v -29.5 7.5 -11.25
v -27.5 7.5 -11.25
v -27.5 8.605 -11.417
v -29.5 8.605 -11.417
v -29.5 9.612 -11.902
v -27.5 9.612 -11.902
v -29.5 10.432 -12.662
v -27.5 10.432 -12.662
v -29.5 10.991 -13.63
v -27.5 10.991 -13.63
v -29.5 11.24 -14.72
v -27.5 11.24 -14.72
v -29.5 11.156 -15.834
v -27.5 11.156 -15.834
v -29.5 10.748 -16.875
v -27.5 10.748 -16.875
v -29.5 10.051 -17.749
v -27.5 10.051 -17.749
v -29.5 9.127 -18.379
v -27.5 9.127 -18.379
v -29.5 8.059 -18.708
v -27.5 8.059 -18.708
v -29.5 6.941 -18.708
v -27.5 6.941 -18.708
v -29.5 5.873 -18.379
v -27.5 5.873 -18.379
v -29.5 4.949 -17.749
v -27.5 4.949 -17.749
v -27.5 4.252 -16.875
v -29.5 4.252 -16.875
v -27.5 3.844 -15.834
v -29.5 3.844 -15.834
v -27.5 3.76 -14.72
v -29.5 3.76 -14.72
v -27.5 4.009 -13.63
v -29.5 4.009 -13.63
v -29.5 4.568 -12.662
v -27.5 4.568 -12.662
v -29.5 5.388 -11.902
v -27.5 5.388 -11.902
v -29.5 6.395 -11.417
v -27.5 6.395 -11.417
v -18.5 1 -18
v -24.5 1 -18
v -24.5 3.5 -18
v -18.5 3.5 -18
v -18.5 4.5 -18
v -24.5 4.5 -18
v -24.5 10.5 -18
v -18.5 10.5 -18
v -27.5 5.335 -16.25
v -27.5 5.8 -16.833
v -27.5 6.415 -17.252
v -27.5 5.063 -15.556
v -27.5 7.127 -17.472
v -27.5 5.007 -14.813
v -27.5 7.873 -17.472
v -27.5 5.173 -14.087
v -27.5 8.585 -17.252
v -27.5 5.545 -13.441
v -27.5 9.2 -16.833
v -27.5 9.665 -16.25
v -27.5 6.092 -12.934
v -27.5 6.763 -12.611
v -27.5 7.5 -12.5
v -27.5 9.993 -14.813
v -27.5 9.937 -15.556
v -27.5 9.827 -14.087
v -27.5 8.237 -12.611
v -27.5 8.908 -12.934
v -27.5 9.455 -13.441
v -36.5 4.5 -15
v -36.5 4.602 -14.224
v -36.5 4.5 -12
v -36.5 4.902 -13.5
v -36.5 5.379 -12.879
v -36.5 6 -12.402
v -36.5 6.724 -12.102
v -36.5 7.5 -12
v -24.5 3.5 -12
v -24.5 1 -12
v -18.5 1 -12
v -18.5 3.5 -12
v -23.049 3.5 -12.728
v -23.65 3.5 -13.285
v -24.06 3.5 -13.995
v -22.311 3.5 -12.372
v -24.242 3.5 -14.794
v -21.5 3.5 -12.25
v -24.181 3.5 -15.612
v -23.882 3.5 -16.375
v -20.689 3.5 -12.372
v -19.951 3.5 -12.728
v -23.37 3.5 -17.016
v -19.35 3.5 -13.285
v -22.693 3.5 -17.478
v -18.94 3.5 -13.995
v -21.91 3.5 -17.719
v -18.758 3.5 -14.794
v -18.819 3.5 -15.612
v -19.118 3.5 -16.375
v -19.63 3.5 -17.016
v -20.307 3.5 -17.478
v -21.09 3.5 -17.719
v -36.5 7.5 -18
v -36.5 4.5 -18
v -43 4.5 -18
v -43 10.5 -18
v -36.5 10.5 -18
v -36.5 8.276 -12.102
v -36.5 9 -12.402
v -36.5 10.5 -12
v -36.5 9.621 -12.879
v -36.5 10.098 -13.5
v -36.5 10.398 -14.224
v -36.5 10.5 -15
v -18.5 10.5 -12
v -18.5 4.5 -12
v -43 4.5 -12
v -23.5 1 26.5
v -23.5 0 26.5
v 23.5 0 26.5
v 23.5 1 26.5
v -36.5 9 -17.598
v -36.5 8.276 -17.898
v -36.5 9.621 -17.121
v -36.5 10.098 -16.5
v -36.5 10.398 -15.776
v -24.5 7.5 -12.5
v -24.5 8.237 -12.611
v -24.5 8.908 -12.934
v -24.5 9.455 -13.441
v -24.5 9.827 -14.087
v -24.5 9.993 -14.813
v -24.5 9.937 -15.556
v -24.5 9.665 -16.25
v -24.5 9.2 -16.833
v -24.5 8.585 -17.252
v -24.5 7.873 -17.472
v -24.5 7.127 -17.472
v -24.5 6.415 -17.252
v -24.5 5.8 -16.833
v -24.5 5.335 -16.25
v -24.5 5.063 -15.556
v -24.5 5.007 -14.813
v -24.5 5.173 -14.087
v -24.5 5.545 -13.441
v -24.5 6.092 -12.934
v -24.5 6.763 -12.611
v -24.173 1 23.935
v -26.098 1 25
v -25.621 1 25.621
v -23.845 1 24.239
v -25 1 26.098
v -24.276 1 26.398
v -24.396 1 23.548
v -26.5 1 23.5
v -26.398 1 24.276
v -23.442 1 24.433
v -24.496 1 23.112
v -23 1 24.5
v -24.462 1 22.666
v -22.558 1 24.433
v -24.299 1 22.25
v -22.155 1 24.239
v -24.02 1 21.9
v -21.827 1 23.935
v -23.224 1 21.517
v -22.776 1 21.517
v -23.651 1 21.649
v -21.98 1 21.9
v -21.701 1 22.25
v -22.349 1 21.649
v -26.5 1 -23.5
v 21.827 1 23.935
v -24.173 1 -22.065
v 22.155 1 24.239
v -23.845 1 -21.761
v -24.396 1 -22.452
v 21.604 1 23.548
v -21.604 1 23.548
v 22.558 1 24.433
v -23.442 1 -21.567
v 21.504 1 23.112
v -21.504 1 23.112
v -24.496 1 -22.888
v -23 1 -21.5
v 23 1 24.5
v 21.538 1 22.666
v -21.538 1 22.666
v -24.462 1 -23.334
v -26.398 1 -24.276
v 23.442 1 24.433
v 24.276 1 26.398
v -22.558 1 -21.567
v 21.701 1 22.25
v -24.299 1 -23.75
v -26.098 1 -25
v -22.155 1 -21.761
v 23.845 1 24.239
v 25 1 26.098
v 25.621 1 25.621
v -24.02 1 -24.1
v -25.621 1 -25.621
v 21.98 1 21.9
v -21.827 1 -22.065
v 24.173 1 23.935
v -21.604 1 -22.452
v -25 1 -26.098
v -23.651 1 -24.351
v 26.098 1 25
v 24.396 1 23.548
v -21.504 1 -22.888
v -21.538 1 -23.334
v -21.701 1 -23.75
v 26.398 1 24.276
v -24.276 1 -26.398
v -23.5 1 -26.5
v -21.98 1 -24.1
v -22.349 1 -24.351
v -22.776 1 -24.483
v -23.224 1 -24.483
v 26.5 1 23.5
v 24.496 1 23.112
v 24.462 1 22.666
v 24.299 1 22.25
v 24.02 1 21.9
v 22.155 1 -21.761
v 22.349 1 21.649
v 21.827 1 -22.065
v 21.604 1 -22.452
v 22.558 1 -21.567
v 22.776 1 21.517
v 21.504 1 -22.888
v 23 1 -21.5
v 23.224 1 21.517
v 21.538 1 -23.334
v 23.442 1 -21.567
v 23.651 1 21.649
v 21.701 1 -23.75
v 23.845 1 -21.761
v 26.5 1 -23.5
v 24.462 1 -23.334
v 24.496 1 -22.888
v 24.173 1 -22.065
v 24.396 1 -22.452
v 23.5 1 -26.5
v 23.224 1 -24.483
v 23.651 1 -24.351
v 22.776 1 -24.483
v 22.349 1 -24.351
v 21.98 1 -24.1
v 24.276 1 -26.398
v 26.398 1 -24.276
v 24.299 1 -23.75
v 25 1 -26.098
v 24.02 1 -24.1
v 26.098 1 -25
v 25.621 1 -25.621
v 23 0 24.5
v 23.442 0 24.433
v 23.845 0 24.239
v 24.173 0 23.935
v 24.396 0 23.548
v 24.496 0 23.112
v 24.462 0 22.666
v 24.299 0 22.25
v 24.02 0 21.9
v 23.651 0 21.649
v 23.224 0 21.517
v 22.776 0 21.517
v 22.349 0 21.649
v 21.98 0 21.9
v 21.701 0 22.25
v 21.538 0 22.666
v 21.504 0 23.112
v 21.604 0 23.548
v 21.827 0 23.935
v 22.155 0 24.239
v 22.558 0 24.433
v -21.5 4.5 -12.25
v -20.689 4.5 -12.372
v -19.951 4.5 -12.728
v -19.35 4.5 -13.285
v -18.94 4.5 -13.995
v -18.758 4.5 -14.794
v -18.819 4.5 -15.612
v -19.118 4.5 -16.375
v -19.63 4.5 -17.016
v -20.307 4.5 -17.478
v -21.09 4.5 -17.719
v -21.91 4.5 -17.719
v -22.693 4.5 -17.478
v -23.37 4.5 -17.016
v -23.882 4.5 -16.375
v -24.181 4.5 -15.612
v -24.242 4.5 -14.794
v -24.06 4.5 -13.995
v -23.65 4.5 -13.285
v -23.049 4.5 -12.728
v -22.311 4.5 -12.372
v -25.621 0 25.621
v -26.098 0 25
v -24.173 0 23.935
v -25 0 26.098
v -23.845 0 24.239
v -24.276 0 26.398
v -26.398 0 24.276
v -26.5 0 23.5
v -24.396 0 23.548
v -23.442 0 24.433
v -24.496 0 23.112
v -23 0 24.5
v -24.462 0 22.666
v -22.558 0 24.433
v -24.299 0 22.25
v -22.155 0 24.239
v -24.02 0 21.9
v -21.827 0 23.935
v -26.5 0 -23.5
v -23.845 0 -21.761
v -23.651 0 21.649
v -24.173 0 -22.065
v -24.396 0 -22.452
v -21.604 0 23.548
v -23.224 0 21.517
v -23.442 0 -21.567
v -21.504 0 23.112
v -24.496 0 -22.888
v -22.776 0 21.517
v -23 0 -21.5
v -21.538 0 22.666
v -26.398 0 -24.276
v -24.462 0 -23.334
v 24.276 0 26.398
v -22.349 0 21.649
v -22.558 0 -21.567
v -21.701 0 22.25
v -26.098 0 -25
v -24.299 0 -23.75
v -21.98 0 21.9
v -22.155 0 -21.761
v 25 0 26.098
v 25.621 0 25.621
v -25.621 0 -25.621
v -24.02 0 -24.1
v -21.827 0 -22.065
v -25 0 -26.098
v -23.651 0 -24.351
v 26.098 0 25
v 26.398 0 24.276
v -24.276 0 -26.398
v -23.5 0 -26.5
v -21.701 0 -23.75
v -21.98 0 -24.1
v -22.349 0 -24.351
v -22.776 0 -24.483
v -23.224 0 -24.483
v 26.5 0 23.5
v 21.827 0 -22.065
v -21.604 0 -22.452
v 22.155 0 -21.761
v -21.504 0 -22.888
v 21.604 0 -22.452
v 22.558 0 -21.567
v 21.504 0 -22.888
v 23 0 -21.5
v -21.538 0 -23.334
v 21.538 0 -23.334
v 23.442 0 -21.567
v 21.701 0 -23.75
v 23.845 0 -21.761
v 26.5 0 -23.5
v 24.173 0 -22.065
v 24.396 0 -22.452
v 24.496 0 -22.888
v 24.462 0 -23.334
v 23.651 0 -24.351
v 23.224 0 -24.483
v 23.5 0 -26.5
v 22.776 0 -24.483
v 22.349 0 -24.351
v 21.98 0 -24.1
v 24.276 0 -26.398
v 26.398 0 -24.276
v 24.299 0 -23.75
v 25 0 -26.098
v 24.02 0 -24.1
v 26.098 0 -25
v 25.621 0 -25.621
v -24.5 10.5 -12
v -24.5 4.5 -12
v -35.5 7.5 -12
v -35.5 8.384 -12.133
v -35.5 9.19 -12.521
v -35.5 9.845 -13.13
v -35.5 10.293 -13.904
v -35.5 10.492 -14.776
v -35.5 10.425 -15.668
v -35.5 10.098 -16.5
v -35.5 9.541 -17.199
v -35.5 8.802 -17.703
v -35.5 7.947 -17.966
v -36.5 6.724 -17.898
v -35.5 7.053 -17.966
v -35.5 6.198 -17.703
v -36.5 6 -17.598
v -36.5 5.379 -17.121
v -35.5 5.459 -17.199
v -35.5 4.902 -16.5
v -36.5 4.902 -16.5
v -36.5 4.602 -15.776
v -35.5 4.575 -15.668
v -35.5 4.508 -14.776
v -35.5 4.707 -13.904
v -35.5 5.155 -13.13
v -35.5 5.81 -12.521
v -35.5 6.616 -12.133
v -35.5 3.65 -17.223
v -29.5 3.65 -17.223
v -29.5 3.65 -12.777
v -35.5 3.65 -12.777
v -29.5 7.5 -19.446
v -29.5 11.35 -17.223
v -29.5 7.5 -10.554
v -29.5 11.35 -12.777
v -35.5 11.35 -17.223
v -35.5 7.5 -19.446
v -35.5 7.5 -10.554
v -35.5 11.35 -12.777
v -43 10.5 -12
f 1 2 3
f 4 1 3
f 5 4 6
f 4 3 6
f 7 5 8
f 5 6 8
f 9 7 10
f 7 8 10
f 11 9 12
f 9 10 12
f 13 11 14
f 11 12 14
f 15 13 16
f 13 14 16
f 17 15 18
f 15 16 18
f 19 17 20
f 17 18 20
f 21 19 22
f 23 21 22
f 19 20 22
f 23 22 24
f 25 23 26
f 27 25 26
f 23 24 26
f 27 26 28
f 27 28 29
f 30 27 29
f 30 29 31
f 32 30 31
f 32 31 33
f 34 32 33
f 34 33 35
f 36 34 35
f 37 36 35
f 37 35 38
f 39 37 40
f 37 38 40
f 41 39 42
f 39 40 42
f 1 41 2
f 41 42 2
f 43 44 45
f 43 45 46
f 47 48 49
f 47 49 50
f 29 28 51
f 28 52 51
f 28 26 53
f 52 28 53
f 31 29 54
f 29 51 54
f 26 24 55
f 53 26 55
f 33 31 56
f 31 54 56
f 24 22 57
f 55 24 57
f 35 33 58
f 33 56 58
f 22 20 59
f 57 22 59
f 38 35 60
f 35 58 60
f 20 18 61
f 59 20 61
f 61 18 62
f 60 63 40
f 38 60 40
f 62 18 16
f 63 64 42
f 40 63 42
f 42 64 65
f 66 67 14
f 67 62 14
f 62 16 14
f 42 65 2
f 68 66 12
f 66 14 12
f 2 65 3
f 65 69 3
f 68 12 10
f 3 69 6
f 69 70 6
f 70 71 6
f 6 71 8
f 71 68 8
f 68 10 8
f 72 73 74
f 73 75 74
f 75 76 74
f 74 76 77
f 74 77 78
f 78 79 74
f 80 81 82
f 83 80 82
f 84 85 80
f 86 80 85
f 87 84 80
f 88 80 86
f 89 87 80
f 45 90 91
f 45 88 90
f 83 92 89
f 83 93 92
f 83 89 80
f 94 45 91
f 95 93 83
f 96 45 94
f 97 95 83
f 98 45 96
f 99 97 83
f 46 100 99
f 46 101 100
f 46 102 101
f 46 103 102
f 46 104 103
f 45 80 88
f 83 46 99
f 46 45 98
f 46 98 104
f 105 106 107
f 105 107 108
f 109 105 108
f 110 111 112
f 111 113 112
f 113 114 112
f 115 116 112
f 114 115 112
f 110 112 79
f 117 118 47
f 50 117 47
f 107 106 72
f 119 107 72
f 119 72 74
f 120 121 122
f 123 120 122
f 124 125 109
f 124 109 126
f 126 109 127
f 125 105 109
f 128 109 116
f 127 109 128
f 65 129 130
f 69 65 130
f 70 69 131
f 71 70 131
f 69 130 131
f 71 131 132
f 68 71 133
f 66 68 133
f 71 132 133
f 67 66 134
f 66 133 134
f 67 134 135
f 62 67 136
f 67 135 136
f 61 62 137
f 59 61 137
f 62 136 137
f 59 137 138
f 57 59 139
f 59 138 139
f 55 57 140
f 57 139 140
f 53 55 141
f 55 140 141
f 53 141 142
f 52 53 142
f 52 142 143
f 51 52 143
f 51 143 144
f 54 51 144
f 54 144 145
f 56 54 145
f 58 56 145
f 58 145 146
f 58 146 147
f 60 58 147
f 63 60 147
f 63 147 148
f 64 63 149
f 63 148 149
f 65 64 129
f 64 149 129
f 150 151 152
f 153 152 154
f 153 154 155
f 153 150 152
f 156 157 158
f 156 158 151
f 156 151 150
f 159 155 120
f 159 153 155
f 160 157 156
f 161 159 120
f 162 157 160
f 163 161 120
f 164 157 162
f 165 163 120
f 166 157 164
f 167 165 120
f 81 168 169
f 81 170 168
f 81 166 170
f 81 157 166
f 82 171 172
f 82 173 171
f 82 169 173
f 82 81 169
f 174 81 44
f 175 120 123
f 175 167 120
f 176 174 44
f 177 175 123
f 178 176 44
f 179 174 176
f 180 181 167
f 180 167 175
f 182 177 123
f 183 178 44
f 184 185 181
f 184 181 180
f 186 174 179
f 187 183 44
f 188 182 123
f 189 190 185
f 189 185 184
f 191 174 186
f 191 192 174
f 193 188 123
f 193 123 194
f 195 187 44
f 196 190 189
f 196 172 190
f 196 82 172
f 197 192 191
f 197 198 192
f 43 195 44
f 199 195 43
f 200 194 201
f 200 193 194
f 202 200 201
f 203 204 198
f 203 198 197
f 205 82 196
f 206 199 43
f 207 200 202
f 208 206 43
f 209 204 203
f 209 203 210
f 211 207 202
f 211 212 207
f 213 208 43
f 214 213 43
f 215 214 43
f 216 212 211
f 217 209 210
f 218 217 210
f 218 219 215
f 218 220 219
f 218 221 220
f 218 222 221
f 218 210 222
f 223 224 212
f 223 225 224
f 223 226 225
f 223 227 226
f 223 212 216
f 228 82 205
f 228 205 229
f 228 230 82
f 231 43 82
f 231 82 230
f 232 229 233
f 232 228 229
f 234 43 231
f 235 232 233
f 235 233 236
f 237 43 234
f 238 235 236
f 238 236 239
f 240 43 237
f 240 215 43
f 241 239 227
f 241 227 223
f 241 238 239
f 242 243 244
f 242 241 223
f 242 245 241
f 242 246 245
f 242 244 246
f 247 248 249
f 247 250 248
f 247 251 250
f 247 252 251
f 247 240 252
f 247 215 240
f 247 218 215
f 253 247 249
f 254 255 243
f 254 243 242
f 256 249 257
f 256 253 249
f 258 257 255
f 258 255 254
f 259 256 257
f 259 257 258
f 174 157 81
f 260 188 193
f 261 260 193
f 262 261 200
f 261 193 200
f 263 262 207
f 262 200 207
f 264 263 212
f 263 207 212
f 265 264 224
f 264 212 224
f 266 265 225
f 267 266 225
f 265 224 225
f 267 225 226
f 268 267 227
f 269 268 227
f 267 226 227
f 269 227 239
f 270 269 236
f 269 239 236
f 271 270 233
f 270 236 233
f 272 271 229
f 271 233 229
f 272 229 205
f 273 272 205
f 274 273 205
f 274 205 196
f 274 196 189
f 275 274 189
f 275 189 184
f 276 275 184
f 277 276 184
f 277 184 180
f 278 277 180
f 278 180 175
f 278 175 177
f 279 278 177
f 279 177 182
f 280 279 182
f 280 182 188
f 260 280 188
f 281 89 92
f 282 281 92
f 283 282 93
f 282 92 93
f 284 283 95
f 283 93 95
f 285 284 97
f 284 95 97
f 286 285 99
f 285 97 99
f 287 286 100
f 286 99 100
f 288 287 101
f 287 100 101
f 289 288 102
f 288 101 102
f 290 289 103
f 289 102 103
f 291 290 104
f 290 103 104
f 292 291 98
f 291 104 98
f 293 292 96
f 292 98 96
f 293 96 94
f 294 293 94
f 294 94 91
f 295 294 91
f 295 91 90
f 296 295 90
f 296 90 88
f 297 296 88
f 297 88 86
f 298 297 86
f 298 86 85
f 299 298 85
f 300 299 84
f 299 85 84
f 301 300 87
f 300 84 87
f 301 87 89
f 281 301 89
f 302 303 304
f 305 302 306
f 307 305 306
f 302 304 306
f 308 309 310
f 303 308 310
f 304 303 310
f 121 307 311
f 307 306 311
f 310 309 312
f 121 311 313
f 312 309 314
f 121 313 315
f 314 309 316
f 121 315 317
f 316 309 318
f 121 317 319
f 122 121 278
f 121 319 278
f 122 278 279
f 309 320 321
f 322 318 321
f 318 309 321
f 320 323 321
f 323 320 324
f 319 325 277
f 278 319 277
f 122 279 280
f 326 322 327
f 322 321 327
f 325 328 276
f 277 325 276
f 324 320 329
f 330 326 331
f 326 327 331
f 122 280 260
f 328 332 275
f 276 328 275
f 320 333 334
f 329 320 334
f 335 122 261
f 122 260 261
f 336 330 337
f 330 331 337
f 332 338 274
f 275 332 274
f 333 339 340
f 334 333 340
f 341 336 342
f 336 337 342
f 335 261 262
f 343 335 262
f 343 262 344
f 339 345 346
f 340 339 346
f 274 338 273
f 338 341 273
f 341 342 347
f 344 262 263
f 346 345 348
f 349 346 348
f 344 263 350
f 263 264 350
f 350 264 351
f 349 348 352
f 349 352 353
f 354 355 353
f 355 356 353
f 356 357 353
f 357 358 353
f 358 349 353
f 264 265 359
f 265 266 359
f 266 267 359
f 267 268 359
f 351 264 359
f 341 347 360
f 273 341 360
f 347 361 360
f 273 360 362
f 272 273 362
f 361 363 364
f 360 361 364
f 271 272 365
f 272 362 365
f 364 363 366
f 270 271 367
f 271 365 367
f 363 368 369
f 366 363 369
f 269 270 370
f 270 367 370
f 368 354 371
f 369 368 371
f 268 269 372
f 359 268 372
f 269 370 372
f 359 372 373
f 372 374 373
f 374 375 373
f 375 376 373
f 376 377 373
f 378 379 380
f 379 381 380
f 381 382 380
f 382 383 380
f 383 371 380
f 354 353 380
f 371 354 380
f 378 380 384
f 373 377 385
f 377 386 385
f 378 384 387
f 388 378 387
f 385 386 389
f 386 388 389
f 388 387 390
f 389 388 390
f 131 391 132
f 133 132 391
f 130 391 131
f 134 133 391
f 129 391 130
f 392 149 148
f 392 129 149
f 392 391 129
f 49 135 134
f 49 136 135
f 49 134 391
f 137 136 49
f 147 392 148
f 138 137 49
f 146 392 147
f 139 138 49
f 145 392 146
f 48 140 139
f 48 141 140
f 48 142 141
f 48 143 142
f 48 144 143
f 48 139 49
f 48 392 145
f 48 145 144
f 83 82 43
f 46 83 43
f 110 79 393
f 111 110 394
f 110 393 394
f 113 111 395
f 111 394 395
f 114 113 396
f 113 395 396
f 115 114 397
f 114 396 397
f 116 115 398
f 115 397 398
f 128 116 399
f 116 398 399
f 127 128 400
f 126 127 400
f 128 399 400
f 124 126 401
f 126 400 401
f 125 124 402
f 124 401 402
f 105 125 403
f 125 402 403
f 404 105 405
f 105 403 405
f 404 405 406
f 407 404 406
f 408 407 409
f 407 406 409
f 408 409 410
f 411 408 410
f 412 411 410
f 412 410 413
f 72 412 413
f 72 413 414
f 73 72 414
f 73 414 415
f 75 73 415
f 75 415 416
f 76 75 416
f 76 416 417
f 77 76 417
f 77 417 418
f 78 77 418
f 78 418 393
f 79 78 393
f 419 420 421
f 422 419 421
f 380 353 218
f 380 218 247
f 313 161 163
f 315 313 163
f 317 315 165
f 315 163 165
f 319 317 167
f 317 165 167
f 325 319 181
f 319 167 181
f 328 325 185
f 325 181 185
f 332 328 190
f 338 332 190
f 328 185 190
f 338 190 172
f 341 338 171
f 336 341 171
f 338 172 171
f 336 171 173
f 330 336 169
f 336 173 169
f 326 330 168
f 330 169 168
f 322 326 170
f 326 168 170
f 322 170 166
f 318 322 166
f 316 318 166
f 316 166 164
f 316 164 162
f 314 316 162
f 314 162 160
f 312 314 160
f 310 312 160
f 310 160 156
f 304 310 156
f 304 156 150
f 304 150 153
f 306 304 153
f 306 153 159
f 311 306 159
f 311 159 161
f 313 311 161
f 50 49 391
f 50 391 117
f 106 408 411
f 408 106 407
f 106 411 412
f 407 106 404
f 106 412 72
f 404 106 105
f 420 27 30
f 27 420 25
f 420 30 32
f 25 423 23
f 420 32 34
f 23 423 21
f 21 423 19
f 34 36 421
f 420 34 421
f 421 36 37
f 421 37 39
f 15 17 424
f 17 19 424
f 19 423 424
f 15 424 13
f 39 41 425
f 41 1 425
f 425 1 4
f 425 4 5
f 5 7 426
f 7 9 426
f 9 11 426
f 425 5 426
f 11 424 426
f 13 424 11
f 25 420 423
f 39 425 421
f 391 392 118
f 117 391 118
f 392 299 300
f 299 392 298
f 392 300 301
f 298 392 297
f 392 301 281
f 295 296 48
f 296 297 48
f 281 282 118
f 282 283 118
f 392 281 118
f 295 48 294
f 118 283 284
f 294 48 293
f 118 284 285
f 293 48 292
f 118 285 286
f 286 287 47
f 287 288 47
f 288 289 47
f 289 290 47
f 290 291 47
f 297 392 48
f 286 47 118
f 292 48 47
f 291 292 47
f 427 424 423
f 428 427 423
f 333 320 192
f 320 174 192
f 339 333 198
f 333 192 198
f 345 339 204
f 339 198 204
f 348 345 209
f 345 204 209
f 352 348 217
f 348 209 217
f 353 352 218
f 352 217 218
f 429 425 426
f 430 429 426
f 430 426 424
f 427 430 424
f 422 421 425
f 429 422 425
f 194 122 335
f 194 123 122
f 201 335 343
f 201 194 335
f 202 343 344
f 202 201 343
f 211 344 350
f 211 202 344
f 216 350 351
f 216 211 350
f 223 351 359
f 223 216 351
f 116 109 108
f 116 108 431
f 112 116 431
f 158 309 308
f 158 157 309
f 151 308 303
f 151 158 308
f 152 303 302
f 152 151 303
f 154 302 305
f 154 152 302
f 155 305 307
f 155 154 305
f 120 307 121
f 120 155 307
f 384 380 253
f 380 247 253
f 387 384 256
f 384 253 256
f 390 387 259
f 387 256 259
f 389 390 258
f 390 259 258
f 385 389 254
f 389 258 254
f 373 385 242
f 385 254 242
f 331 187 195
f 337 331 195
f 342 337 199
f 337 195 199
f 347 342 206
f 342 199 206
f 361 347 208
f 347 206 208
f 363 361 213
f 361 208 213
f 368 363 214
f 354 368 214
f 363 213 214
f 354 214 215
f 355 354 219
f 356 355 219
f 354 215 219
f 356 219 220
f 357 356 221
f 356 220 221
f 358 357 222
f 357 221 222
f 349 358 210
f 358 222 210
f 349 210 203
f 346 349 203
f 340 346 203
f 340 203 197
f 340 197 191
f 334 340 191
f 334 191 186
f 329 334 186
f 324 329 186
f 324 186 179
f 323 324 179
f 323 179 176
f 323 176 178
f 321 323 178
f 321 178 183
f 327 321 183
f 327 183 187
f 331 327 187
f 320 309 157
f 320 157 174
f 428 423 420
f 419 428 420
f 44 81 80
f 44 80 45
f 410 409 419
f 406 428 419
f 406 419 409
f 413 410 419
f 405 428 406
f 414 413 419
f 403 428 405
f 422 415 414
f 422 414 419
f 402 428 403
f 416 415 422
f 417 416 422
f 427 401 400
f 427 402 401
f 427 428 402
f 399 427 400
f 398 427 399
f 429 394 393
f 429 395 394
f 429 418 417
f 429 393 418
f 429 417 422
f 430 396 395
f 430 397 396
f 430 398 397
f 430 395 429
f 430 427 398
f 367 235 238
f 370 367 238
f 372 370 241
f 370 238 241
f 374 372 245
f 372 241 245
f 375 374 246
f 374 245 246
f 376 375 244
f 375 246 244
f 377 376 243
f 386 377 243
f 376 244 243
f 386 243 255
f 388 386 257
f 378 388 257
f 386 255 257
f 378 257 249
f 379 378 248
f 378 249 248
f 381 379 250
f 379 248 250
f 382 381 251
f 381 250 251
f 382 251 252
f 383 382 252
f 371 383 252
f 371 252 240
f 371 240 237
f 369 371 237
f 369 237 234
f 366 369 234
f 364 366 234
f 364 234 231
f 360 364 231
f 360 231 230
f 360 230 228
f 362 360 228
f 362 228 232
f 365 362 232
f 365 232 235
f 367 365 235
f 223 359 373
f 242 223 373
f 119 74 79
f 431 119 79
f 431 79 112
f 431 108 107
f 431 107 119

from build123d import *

# Parameters (mm, degrees)
SKETCH_1_W          = 53
SKETCH_1_H          = 53
EXTRUDE_1_DEPTH     = 1
SKETCH_2_W          = 6
SKETCH_2_H          = 6
EXTRUDE_2_DEPTH     = 2.5
SKETCH_3_R          = 2.75
EXTRUDE_3_DEPTH     = 1
SKETCH_4_W          = 6
SKETCH_4_H          = 6
EXTRUDE_4_DEPTH     = 6
SKETCH_5_R          = 2.5
EXTRUDE_5_DEPTH     = 3
SKETCH_6_R          = 3.75
EXTRUDE_6_DEPTH     = 2
EXTRUDE_7_DEPTH     = 6
SKETCH_8_R          = 3
EXTRUDE_8_DEPTH     = 1
SKETCH_9_W          = 6
SKETCH_9_H          = 6
EXTRUDE_9_DEPTH     = 6.5
SKETCH_11_R         = 1.5
CUT_EXTRUDE_1_DEPTH = 52.559407483
FILLET_1_R          = 3


with BuildPart() as part:
    # 草图1 → 凸台-拉伸1 (new body)
    with BuildSketch(Plane(origin=(0, 0, 0), x_dir=(1, 0, 0), z_dir=(0, 1, 0))):
        Rectangle(SKETCH_1_W, SKETCH_1_H)
    extrude(amount=EXTRUDE_1_DEPTH)

    # 草图2 → 凸台-拉伸2 (add)
    with BuildSketch(Plane(origin=(0, 1, 0), x_dir=(1, 0, 0), z_dir=(0, 1, 0))):
        with Locations((-21.5, 15)):
            Rectangle(SKETCH_2_W, SKETCH_2_H)
    extrude(amount=EXTRUDE_2_DEPTH)

    # 草图3 → 凸台-拉伸3 (add)
    with BuildSketch(Plane(origin=(0, 3.5, 0), x_dir=(1, 0, 0), z_dir=(0, 1, 0))):
        with Locations(Location((-21.5, 15, 0), (0, 0, 270))):
            Circle(SKETCH_3_R)
    extrude(amount=EXTRUDE_3_DEPTH)

    # 草图4 → 凸台-拉伸4 (add)
    with BuildSketch(Plane(origin=(0, 4.5, 0), x_dir=(1, 0, 0), z_dir=(0, 1, 0))):
        with Locations((-21.5, 15)):
            Rectangle(SKETCH_4_W, SKETCH_4_H)
    extrude(amount=EXTRUDE_4_DEPTH)

    # 草图5 → 凸台-拉伸5 (add)
    with BuildSketch(Plane.ZY.offset(24.5)):
        with Locations((-15, 7.5)):
            Circle(SKETCH_5_R)
    extrude(amount=EXTRUDE_5_DEPTH)

    # 草图6 → 凸台-拉伸6 (add)
    with BuildSketch(Plane.ZY.offset(27.5)):
        with Locations((-15, 7.5)):
            Circle(SKETCH_6_R)
    extrude(amount=EXTRUDE_6_DEPTH)

    # 草图7 → 凸台-拉伸7 (add)
    with BuildSketch(Plane.ZY.offset(29.5)):
        Polygon((-10.554402927, 7.5), (-12.777201464, 11.35), (-17.222798536, 11.35), (-19.445597073, 7.5), (-17.222798536, 3.65), (-12.777201464, 3.65), align=None)
    extrude(amount=EXTRUDE_7_DEPTH)

    # 草图8 → 凸台-拉伸8 (add)
    with BuildSketch(Plane.ZY.offset(35.5)):
        with Locations((-15, 7.5)):
            Circle(SKETCH_8_R)
    extrude(amount=EXTRUDE_8_DEPTH)

    # 草图9 → 凸台-拉伸9 (add)
    with BuildSketch(Plane.ZY.offset(36.5)):
        with Locations((-15, 7.5)):
            Rectangle(SKETCH_9_W, SKETCH_9_H)
    extrude(amount=EXTRUDE_9_DEPTH)

    # 草图11 → 切除-拉伸1 (cut, through all)
    with BuildSketch(Plane(origin=(0, 1, 0), x_dir=(1, 0, 0), z_dir=(0, 1, 0))):
        with Locations(Location((-23, -23, 0), (0, 0, 270))):
            Circle(SKETCH_11_R)
        with Locations(Location((-23, 23, 0), (0, 0, 270))):
            Circle(SKETCH_11_R)
        with Locations(Location((23, 23, 0), (0, 0, 270))):
            Circle(SKETCH_11_R)
        with Locations(Location((23, -23, 0), (0, 0, 270))):
            Circle(SKETCH_11_R)
    extrude(amount=-CUT_EXTRUDE_1_DEPTH, mode=Mode.SUBTRACT)

    # 圆角1
    fillet_1_edges = [part.edges().sort_by_distance(p)[0] for p in [
        (26.5, 0.5, 26.5),
        (-26.5, 0.5, 26.5),
        (-26.5, 0.5, -26.5),
        (26.5, 0.5, -26.5),
    ]]
    fillet(fillet_1_edges, radius=FILLET_1_R)


solid = part.part
